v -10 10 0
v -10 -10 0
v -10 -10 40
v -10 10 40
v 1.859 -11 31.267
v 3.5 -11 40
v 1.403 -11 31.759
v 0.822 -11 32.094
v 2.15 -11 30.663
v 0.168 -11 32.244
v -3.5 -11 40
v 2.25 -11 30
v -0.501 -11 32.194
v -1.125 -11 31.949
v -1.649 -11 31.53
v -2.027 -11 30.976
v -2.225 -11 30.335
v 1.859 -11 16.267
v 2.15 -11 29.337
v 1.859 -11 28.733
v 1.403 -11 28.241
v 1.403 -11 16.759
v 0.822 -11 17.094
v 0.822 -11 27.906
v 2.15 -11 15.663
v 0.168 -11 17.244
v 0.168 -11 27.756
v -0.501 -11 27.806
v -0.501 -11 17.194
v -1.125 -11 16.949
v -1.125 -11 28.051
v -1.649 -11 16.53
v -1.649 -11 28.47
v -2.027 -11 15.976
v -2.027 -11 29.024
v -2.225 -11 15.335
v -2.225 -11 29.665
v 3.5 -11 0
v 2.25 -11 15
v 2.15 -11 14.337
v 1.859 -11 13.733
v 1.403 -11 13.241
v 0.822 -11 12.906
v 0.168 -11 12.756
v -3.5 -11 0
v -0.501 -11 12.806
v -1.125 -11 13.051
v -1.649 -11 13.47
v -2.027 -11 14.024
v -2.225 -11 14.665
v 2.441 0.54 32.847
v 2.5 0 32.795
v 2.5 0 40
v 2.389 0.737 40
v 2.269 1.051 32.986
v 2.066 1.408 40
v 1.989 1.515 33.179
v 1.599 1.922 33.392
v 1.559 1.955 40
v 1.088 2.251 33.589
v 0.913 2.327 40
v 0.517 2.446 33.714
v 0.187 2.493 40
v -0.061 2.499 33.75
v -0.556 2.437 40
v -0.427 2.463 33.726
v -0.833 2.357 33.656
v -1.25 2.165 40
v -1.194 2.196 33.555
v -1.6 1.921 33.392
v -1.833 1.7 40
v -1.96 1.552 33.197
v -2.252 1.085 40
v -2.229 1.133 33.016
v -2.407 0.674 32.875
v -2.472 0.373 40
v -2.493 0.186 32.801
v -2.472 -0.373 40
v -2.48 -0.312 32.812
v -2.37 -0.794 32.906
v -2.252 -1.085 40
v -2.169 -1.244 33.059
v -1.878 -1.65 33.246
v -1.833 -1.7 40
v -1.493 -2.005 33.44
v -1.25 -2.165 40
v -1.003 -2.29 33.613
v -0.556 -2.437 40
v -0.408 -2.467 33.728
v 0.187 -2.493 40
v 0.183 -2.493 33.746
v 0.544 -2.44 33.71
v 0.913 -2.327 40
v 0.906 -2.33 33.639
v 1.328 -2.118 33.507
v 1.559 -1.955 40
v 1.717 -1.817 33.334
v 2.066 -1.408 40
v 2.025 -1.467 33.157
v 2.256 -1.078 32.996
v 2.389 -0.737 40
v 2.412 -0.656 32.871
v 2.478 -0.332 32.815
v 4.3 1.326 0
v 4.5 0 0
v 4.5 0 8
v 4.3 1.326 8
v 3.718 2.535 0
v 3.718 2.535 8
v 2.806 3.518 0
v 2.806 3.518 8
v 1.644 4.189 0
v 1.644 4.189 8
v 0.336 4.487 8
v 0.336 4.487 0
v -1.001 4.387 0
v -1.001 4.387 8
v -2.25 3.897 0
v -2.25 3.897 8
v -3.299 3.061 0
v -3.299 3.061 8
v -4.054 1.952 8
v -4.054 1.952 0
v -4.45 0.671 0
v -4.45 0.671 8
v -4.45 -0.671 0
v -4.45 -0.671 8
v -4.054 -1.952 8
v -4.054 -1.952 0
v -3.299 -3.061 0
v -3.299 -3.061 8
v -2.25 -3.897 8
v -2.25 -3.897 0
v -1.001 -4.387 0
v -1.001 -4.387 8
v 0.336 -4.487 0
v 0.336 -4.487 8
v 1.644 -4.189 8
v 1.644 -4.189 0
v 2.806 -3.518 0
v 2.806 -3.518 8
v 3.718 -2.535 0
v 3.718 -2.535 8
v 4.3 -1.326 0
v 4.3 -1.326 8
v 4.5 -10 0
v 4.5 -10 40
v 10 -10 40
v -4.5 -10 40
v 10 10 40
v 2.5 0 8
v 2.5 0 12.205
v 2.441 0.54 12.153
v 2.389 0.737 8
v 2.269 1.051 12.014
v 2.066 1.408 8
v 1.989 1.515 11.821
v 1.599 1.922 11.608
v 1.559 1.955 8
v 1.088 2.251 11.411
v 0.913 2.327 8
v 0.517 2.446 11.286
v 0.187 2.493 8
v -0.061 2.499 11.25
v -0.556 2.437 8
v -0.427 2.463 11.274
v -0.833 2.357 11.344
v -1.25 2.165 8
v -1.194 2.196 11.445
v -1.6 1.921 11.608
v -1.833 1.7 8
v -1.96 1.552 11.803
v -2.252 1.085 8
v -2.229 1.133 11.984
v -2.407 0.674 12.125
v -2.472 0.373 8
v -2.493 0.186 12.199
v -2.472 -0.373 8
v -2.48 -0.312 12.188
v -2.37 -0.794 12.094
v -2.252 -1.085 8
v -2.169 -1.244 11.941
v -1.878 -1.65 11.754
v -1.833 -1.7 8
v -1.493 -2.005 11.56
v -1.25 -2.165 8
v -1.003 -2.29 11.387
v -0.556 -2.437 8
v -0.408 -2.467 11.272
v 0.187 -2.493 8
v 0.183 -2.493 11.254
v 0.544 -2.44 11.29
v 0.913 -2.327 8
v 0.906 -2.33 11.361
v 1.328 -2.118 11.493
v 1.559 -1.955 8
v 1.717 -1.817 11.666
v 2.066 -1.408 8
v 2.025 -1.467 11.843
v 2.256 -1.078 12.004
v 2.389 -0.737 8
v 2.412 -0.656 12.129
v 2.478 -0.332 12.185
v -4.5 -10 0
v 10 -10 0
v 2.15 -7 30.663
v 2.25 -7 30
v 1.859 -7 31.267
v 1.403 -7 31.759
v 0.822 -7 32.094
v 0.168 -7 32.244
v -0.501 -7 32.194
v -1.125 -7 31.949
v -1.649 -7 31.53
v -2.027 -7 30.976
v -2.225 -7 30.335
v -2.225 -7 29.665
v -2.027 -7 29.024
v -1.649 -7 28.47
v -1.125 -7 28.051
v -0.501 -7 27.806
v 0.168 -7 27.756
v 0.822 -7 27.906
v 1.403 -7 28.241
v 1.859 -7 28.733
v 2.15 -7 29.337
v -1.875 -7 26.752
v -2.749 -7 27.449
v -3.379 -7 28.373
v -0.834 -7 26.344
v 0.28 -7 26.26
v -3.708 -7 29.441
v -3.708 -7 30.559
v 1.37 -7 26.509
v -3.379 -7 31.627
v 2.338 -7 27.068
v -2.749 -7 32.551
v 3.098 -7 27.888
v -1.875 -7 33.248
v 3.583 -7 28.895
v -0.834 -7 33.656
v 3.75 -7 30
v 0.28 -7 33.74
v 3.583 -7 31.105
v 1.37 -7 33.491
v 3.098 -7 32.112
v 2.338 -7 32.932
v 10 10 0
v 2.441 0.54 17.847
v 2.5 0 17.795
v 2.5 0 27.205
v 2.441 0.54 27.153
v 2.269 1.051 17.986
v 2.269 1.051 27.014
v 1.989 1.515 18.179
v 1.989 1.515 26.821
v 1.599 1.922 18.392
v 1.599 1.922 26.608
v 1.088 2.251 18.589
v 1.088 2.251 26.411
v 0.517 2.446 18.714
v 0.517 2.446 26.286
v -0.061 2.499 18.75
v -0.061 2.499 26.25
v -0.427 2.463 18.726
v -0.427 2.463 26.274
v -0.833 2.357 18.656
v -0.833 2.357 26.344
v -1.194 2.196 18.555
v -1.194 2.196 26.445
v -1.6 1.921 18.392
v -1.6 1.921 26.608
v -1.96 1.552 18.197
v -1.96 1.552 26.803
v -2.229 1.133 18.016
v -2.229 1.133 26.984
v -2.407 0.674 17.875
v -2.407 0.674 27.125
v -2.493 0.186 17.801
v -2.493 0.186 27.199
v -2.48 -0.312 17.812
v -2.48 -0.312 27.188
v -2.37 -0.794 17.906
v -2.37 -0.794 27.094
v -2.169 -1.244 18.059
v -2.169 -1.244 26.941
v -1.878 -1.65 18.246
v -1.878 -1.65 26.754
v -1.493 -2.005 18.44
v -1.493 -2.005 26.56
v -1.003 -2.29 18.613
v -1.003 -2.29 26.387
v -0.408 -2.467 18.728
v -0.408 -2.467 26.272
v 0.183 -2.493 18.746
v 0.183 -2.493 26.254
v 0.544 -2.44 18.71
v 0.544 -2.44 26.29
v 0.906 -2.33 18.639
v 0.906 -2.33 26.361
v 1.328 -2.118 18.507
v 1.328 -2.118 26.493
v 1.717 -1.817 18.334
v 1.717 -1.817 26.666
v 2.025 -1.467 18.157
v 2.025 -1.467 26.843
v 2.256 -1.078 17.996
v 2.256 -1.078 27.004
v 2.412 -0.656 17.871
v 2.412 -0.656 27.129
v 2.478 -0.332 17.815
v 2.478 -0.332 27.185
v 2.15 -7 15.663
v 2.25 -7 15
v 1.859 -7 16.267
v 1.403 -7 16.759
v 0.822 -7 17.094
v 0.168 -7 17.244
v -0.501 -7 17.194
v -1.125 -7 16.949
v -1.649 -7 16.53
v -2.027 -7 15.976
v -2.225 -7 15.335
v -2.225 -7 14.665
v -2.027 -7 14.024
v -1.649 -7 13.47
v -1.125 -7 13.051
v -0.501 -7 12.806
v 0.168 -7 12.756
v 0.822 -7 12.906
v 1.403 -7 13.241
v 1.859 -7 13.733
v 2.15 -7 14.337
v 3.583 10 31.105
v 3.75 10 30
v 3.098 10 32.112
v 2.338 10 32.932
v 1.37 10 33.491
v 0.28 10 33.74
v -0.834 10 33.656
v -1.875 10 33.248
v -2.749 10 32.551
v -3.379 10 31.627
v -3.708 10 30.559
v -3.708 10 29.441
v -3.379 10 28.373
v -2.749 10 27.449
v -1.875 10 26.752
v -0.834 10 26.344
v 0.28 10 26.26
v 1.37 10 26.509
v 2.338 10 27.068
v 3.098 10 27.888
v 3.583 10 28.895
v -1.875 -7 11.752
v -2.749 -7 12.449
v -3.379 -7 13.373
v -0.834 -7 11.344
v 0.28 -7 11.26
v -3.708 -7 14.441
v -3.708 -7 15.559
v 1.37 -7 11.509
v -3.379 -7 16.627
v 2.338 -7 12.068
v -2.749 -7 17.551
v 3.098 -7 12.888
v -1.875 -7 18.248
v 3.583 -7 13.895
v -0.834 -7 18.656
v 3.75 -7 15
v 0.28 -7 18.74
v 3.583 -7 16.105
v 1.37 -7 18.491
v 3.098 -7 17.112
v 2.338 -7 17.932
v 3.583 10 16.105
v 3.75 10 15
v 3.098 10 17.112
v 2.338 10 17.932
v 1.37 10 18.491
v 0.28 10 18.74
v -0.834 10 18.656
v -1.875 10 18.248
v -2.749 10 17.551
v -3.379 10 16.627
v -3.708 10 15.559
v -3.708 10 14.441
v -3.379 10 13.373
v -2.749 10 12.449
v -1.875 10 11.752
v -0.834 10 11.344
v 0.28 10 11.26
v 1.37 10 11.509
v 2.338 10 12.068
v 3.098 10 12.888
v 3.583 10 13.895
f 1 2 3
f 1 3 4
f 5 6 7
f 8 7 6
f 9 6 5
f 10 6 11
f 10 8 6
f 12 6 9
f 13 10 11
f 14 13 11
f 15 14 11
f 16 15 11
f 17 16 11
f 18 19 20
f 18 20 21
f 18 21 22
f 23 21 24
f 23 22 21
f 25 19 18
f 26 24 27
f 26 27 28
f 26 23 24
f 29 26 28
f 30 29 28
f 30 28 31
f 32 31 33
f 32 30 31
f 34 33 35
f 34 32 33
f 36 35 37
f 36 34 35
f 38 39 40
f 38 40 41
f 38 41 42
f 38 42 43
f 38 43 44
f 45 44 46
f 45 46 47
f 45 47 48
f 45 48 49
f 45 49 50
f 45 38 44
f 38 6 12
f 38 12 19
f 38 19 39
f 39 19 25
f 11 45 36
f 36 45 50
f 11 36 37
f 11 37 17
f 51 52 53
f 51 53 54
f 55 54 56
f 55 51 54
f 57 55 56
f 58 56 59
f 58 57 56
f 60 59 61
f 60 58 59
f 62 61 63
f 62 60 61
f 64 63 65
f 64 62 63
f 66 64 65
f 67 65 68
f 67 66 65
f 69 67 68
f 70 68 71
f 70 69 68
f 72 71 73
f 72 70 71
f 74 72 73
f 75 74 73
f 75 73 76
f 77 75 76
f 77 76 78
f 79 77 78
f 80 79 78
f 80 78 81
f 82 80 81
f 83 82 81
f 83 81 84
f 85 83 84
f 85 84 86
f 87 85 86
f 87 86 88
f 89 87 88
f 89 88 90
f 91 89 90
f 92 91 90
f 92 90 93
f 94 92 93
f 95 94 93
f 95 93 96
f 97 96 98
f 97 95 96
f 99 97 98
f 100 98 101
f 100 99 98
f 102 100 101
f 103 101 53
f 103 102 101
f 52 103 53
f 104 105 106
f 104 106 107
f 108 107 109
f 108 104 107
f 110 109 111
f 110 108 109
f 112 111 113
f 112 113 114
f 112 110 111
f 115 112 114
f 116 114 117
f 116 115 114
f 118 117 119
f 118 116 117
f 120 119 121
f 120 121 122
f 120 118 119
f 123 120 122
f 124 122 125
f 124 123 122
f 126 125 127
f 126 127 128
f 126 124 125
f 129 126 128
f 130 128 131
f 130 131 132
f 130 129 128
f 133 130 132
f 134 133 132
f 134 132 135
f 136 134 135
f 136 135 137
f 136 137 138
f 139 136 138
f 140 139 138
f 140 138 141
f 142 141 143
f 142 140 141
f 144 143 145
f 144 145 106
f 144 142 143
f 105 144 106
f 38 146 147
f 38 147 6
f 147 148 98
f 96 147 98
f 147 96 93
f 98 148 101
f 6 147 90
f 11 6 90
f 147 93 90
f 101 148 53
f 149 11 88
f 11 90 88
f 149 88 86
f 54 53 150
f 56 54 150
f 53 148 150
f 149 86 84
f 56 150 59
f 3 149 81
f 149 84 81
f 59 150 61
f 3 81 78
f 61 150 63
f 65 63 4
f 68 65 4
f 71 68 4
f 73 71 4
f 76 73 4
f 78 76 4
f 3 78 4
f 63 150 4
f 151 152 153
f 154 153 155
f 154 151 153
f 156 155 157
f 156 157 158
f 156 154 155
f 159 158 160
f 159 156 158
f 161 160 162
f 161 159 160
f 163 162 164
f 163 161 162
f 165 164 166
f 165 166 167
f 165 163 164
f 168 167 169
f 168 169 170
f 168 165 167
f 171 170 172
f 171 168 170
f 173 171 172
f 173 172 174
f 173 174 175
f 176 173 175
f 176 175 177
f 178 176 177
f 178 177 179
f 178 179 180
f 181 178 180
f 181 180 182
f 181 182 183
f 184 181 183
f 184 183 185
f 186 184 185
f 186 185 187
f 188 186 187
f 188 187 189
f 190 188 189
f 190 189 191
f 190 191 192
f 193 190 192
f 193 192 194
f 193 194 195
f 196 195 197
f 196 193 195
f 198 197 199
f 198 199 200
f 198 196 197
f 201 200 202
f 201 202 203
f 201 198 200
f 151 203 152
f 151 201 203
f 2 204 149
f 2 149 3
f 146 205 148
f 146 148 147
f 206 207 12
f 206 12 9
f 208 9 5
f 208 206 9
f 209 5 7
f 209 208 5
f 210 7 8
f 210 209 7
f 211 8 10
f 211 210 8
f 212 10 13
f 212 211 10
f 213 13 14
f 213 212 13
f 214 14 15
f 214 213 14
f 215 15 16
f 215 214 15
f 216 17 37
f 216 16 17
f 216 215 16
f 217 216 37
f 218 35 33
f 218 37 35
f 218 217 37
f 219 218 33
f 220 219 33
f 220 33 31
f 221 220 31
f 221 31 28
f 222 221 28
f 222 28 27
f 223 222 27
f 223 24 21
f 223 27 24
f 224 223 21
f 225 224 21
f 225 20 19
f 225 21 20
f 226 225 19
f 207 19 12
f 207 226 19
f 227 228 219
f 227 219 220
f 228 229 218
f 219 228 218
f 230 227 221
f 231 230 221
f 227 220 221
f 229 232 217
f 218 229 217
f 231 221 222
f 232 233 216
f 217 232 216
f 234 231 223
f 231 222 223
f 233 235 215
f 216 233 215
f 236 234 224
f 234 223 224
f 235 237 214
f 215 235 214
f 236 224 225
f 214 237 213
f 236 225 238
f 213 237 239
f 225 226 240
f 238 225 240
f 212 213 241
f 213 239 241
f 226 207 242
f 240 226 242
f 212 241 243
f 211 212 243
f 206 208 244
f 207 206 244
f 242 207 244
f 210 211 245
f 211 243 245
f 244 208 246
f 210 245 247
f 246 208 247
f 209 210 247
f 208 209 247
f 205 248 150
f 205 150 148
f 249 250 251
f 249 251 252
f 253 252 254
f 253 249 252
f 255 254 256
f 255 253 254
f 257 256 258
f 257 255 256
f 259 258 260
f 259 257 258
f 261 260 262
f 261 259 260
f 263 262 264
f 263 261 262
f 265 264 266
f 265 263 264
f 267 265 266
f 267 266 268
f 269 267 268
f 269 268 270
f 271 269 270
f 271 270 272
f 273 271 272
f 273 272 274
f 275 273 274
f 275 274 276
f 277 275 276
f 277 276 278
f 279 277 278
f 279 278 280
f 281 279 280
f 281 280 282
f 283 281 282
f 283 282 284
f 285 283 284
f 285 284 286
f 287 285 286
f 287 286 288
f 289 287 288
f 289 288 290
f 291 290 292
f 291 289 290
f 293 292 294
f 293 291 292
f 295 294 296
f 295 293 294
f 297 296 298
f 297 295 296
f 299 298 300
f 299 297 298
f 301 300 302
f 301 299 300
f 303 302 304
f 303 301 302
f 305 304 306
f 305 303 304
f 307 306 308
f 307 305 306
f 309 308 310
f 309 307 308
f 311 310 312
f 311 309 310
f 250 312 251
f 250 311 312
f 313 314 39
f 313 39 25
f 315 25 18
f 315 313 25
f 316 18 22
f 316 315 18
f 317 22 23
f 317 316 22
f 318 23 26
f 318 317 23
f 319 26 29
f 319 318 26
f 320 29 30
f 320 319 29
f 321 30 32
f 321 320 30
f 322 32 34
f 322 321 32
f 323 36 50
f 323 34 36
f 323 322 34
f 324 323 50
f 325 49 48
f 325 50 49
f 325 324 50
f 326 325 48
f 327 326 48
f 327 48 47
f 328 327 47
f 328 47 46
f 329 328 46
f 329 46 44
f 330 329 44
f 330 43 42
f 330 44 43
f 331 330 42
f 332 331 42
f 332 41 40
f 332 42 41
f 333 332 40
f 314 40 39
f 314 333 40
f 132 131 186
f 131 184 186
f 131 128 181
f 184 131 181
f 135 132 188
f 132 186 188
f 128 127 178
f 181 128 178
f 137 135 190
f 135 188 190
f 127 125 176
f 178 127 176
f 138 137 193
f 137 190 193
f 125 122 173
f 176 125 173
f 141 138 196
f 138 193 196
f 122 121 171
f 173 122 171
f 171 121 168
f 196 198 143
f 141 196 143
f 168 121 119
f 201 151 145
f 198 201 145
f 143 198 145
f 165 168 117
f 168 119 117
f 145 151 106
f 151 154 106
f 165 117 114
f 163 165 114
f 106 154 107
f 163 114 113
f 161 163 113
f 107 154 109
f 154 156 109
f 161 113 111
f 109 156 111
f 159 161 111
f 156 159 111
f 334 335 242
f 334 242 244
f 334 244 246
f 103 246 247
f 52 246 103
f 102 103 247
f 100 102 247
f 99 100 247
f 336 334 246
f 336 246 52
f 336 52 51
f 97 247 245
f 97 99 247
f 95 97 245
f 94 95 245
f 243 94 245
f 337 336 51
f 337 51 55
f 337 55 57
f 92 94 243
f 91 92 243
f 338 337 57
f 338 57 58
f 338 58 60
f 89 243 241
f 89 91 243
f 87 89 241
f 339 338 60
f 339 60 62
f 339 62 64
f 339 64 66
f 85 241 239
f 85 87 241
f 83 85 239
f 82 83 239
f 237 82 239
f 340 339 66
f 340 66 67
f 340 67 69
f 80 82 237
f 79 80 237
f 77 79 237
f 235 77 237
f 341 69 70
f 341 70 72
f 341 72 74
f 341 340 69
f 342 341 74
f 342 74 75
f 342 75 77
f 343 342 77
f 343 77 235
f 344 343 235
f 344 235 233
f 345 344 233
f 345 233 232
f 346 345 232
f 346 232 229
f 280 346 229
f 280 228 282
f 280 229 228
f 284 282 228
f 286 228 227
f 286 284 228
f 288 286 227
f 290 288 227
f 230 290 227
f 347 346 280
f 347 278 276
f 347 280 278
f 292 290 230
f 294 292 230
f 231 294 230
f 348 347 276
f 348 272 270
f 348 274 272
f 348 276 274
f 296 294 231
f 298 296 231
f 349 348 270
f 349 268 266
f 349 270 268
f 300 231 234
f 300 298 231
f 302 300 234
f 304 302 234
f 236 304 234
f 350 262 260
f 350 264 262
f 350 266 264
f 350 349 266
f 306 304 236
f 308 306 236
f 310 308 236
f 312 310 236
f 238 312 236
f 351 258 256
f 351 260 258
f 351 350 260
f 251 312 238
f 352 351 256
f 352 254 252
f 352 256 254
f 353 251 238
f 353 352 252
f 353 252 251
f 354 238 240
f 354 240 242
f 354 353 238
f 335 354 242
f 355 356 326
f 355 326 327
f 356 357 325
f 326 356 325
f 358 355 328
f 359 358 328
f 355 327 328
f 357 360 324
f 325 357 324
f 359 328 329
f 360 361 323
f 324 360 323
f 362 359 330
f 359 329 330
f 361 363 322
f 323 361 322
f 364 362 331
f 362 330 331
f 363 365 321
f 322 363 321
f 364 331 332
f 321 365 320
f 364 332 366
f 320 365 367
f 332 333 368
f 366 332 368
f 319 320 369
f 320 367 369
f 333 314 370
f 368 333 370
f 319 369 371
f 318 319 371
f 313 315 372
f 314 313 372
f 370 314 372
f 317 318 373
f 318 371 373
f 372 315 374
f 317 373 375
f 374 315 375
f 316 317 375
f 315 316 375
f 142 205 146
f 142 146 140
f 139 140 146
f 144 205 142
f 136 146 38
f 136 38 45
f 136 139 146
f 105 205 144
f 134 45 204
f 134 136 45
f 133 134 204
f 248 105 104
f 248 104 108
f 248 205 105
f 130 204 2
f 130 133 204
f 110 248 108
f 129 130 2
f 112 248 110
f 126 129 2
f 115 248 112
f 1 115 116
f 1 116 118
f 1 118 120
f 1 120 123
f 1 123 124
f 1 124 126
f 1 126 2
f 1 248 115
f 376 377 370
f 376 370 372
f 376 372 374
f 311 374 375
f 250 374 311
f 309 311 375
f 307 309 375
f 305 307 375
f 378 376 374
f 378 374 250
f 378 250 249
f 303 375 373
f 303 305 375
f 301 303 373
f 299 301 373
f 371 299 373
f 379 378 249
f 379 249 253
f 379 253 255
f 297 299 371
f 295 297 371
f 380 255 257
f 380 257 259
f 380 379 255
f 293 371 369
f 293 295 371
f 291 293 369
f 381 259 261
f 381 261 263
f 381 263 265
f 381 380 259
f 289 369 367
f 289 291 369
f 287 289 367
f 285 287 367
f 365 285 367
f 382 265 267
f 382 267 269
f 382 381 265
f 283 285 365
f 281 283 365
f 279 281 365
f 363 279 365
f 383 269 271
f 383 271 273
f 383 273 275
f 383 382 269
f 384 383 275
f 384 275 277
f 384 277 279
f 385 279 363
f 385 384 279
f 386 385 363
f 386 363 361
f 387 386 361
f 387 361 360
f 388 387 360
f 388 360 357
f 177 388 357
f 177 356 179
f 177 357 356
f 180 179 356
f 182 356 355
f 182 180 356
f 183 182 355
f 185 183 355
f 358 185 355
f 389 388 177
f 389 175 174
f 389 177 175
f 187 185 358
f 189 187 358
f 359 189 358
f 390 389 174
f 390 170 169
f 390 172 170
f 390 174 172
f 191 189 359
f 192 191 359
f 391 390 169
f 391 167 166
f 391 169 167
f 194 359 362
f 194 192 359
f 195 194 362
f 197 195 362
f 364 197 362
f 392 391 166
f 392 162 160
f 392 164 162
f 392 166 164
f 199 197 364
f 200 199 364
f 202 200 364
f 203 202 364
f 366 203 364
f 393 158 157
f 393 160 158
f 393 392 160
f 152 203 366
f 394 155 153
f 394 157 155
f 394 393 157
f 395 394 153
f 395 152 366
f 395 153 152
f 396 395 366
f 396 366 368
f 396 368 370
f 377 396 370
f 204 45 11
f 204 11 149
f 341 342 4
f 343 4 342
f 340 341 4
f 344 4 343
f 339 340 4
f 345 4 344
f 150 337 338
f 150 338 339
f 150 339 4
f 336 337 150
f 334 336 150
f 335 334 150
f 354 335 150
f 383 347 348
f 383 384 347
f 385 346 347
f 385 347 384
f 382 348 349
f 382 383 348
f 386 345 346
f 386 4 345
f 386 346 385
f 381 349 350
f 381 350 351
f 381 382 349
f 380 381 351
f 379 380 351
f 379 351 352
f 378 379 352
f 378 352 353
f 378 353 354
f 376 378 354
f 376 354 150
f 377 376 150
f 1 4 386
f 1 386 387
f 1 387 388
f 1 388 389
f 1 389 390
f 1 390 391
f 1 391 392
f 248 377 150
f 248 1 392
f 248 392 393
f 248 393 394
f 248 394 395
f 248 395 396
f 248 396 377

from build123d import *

# Parameters (mm, degrees)
PAD_DEPTH       = 40
SKETCH001_R     = 2.5
POCKET_DEPTH    = 40
SKETCH002_R     = 4.5
POCKET001_DEPTH = 8
SKETCH003_R     = 2.25
POCKET002_DEPTH = 22
SKETCH004_R     = 3.75
POCKET003_DEPTH = 17


with BuildPart() as part:
    # Sketch → Pad (new body)
    with BuildSketch(Plane.XY):
        Polygon((-10, -10), (-10, 10), (10, 10), (10, -10), (4.5, -10), (3.5, -11), (-3.5, -11), (-4.5, -10), align=None)
    extrude(amount=PAD_DEPTH)

    # Sketch001 → Pocket (cut)
    with BuildSketch(Plane.XY):
        Circle(SKETCH001_R)
    extrude(amount=POCKET_DEPTH, mode=Mode.SUBTRACT)

    # Sketch002 → Pocket001 (cut)
    with BuildSketch(Plane.XY):
        Circle(SKETCH002_R)
    extrude(amount=POCKET001_DEPTH, mode=Mode.SUBTRACT)

    # Sketch003 (on DatumPlane) → Pocket002 (cut)
    with BuildSketch(Plane.XZ.offset(-10)):
        with Locations((0, 15)):
            Circle(SKETCH003_R)
        with Locations((0, 30)):
            Circle(SKETCH003_R)
    extrude(amount=POCKET002_DEPTH, mode=Mode.SUBTRACT)

    # Sketch004 (on DatumPlane) → Pocket003 (cut)
    with BuildSketch(Plane.XZ.offset(-10)):
        with Locations((0, 30)):
            Circle(SKETCH004_R)
        with Locations((0, 15)):
            Circle(SKETCH004_R)
    extrude(amount=POCKET003_DEPTH, mode=Mode.SUBTRACT)


solid = part.part
